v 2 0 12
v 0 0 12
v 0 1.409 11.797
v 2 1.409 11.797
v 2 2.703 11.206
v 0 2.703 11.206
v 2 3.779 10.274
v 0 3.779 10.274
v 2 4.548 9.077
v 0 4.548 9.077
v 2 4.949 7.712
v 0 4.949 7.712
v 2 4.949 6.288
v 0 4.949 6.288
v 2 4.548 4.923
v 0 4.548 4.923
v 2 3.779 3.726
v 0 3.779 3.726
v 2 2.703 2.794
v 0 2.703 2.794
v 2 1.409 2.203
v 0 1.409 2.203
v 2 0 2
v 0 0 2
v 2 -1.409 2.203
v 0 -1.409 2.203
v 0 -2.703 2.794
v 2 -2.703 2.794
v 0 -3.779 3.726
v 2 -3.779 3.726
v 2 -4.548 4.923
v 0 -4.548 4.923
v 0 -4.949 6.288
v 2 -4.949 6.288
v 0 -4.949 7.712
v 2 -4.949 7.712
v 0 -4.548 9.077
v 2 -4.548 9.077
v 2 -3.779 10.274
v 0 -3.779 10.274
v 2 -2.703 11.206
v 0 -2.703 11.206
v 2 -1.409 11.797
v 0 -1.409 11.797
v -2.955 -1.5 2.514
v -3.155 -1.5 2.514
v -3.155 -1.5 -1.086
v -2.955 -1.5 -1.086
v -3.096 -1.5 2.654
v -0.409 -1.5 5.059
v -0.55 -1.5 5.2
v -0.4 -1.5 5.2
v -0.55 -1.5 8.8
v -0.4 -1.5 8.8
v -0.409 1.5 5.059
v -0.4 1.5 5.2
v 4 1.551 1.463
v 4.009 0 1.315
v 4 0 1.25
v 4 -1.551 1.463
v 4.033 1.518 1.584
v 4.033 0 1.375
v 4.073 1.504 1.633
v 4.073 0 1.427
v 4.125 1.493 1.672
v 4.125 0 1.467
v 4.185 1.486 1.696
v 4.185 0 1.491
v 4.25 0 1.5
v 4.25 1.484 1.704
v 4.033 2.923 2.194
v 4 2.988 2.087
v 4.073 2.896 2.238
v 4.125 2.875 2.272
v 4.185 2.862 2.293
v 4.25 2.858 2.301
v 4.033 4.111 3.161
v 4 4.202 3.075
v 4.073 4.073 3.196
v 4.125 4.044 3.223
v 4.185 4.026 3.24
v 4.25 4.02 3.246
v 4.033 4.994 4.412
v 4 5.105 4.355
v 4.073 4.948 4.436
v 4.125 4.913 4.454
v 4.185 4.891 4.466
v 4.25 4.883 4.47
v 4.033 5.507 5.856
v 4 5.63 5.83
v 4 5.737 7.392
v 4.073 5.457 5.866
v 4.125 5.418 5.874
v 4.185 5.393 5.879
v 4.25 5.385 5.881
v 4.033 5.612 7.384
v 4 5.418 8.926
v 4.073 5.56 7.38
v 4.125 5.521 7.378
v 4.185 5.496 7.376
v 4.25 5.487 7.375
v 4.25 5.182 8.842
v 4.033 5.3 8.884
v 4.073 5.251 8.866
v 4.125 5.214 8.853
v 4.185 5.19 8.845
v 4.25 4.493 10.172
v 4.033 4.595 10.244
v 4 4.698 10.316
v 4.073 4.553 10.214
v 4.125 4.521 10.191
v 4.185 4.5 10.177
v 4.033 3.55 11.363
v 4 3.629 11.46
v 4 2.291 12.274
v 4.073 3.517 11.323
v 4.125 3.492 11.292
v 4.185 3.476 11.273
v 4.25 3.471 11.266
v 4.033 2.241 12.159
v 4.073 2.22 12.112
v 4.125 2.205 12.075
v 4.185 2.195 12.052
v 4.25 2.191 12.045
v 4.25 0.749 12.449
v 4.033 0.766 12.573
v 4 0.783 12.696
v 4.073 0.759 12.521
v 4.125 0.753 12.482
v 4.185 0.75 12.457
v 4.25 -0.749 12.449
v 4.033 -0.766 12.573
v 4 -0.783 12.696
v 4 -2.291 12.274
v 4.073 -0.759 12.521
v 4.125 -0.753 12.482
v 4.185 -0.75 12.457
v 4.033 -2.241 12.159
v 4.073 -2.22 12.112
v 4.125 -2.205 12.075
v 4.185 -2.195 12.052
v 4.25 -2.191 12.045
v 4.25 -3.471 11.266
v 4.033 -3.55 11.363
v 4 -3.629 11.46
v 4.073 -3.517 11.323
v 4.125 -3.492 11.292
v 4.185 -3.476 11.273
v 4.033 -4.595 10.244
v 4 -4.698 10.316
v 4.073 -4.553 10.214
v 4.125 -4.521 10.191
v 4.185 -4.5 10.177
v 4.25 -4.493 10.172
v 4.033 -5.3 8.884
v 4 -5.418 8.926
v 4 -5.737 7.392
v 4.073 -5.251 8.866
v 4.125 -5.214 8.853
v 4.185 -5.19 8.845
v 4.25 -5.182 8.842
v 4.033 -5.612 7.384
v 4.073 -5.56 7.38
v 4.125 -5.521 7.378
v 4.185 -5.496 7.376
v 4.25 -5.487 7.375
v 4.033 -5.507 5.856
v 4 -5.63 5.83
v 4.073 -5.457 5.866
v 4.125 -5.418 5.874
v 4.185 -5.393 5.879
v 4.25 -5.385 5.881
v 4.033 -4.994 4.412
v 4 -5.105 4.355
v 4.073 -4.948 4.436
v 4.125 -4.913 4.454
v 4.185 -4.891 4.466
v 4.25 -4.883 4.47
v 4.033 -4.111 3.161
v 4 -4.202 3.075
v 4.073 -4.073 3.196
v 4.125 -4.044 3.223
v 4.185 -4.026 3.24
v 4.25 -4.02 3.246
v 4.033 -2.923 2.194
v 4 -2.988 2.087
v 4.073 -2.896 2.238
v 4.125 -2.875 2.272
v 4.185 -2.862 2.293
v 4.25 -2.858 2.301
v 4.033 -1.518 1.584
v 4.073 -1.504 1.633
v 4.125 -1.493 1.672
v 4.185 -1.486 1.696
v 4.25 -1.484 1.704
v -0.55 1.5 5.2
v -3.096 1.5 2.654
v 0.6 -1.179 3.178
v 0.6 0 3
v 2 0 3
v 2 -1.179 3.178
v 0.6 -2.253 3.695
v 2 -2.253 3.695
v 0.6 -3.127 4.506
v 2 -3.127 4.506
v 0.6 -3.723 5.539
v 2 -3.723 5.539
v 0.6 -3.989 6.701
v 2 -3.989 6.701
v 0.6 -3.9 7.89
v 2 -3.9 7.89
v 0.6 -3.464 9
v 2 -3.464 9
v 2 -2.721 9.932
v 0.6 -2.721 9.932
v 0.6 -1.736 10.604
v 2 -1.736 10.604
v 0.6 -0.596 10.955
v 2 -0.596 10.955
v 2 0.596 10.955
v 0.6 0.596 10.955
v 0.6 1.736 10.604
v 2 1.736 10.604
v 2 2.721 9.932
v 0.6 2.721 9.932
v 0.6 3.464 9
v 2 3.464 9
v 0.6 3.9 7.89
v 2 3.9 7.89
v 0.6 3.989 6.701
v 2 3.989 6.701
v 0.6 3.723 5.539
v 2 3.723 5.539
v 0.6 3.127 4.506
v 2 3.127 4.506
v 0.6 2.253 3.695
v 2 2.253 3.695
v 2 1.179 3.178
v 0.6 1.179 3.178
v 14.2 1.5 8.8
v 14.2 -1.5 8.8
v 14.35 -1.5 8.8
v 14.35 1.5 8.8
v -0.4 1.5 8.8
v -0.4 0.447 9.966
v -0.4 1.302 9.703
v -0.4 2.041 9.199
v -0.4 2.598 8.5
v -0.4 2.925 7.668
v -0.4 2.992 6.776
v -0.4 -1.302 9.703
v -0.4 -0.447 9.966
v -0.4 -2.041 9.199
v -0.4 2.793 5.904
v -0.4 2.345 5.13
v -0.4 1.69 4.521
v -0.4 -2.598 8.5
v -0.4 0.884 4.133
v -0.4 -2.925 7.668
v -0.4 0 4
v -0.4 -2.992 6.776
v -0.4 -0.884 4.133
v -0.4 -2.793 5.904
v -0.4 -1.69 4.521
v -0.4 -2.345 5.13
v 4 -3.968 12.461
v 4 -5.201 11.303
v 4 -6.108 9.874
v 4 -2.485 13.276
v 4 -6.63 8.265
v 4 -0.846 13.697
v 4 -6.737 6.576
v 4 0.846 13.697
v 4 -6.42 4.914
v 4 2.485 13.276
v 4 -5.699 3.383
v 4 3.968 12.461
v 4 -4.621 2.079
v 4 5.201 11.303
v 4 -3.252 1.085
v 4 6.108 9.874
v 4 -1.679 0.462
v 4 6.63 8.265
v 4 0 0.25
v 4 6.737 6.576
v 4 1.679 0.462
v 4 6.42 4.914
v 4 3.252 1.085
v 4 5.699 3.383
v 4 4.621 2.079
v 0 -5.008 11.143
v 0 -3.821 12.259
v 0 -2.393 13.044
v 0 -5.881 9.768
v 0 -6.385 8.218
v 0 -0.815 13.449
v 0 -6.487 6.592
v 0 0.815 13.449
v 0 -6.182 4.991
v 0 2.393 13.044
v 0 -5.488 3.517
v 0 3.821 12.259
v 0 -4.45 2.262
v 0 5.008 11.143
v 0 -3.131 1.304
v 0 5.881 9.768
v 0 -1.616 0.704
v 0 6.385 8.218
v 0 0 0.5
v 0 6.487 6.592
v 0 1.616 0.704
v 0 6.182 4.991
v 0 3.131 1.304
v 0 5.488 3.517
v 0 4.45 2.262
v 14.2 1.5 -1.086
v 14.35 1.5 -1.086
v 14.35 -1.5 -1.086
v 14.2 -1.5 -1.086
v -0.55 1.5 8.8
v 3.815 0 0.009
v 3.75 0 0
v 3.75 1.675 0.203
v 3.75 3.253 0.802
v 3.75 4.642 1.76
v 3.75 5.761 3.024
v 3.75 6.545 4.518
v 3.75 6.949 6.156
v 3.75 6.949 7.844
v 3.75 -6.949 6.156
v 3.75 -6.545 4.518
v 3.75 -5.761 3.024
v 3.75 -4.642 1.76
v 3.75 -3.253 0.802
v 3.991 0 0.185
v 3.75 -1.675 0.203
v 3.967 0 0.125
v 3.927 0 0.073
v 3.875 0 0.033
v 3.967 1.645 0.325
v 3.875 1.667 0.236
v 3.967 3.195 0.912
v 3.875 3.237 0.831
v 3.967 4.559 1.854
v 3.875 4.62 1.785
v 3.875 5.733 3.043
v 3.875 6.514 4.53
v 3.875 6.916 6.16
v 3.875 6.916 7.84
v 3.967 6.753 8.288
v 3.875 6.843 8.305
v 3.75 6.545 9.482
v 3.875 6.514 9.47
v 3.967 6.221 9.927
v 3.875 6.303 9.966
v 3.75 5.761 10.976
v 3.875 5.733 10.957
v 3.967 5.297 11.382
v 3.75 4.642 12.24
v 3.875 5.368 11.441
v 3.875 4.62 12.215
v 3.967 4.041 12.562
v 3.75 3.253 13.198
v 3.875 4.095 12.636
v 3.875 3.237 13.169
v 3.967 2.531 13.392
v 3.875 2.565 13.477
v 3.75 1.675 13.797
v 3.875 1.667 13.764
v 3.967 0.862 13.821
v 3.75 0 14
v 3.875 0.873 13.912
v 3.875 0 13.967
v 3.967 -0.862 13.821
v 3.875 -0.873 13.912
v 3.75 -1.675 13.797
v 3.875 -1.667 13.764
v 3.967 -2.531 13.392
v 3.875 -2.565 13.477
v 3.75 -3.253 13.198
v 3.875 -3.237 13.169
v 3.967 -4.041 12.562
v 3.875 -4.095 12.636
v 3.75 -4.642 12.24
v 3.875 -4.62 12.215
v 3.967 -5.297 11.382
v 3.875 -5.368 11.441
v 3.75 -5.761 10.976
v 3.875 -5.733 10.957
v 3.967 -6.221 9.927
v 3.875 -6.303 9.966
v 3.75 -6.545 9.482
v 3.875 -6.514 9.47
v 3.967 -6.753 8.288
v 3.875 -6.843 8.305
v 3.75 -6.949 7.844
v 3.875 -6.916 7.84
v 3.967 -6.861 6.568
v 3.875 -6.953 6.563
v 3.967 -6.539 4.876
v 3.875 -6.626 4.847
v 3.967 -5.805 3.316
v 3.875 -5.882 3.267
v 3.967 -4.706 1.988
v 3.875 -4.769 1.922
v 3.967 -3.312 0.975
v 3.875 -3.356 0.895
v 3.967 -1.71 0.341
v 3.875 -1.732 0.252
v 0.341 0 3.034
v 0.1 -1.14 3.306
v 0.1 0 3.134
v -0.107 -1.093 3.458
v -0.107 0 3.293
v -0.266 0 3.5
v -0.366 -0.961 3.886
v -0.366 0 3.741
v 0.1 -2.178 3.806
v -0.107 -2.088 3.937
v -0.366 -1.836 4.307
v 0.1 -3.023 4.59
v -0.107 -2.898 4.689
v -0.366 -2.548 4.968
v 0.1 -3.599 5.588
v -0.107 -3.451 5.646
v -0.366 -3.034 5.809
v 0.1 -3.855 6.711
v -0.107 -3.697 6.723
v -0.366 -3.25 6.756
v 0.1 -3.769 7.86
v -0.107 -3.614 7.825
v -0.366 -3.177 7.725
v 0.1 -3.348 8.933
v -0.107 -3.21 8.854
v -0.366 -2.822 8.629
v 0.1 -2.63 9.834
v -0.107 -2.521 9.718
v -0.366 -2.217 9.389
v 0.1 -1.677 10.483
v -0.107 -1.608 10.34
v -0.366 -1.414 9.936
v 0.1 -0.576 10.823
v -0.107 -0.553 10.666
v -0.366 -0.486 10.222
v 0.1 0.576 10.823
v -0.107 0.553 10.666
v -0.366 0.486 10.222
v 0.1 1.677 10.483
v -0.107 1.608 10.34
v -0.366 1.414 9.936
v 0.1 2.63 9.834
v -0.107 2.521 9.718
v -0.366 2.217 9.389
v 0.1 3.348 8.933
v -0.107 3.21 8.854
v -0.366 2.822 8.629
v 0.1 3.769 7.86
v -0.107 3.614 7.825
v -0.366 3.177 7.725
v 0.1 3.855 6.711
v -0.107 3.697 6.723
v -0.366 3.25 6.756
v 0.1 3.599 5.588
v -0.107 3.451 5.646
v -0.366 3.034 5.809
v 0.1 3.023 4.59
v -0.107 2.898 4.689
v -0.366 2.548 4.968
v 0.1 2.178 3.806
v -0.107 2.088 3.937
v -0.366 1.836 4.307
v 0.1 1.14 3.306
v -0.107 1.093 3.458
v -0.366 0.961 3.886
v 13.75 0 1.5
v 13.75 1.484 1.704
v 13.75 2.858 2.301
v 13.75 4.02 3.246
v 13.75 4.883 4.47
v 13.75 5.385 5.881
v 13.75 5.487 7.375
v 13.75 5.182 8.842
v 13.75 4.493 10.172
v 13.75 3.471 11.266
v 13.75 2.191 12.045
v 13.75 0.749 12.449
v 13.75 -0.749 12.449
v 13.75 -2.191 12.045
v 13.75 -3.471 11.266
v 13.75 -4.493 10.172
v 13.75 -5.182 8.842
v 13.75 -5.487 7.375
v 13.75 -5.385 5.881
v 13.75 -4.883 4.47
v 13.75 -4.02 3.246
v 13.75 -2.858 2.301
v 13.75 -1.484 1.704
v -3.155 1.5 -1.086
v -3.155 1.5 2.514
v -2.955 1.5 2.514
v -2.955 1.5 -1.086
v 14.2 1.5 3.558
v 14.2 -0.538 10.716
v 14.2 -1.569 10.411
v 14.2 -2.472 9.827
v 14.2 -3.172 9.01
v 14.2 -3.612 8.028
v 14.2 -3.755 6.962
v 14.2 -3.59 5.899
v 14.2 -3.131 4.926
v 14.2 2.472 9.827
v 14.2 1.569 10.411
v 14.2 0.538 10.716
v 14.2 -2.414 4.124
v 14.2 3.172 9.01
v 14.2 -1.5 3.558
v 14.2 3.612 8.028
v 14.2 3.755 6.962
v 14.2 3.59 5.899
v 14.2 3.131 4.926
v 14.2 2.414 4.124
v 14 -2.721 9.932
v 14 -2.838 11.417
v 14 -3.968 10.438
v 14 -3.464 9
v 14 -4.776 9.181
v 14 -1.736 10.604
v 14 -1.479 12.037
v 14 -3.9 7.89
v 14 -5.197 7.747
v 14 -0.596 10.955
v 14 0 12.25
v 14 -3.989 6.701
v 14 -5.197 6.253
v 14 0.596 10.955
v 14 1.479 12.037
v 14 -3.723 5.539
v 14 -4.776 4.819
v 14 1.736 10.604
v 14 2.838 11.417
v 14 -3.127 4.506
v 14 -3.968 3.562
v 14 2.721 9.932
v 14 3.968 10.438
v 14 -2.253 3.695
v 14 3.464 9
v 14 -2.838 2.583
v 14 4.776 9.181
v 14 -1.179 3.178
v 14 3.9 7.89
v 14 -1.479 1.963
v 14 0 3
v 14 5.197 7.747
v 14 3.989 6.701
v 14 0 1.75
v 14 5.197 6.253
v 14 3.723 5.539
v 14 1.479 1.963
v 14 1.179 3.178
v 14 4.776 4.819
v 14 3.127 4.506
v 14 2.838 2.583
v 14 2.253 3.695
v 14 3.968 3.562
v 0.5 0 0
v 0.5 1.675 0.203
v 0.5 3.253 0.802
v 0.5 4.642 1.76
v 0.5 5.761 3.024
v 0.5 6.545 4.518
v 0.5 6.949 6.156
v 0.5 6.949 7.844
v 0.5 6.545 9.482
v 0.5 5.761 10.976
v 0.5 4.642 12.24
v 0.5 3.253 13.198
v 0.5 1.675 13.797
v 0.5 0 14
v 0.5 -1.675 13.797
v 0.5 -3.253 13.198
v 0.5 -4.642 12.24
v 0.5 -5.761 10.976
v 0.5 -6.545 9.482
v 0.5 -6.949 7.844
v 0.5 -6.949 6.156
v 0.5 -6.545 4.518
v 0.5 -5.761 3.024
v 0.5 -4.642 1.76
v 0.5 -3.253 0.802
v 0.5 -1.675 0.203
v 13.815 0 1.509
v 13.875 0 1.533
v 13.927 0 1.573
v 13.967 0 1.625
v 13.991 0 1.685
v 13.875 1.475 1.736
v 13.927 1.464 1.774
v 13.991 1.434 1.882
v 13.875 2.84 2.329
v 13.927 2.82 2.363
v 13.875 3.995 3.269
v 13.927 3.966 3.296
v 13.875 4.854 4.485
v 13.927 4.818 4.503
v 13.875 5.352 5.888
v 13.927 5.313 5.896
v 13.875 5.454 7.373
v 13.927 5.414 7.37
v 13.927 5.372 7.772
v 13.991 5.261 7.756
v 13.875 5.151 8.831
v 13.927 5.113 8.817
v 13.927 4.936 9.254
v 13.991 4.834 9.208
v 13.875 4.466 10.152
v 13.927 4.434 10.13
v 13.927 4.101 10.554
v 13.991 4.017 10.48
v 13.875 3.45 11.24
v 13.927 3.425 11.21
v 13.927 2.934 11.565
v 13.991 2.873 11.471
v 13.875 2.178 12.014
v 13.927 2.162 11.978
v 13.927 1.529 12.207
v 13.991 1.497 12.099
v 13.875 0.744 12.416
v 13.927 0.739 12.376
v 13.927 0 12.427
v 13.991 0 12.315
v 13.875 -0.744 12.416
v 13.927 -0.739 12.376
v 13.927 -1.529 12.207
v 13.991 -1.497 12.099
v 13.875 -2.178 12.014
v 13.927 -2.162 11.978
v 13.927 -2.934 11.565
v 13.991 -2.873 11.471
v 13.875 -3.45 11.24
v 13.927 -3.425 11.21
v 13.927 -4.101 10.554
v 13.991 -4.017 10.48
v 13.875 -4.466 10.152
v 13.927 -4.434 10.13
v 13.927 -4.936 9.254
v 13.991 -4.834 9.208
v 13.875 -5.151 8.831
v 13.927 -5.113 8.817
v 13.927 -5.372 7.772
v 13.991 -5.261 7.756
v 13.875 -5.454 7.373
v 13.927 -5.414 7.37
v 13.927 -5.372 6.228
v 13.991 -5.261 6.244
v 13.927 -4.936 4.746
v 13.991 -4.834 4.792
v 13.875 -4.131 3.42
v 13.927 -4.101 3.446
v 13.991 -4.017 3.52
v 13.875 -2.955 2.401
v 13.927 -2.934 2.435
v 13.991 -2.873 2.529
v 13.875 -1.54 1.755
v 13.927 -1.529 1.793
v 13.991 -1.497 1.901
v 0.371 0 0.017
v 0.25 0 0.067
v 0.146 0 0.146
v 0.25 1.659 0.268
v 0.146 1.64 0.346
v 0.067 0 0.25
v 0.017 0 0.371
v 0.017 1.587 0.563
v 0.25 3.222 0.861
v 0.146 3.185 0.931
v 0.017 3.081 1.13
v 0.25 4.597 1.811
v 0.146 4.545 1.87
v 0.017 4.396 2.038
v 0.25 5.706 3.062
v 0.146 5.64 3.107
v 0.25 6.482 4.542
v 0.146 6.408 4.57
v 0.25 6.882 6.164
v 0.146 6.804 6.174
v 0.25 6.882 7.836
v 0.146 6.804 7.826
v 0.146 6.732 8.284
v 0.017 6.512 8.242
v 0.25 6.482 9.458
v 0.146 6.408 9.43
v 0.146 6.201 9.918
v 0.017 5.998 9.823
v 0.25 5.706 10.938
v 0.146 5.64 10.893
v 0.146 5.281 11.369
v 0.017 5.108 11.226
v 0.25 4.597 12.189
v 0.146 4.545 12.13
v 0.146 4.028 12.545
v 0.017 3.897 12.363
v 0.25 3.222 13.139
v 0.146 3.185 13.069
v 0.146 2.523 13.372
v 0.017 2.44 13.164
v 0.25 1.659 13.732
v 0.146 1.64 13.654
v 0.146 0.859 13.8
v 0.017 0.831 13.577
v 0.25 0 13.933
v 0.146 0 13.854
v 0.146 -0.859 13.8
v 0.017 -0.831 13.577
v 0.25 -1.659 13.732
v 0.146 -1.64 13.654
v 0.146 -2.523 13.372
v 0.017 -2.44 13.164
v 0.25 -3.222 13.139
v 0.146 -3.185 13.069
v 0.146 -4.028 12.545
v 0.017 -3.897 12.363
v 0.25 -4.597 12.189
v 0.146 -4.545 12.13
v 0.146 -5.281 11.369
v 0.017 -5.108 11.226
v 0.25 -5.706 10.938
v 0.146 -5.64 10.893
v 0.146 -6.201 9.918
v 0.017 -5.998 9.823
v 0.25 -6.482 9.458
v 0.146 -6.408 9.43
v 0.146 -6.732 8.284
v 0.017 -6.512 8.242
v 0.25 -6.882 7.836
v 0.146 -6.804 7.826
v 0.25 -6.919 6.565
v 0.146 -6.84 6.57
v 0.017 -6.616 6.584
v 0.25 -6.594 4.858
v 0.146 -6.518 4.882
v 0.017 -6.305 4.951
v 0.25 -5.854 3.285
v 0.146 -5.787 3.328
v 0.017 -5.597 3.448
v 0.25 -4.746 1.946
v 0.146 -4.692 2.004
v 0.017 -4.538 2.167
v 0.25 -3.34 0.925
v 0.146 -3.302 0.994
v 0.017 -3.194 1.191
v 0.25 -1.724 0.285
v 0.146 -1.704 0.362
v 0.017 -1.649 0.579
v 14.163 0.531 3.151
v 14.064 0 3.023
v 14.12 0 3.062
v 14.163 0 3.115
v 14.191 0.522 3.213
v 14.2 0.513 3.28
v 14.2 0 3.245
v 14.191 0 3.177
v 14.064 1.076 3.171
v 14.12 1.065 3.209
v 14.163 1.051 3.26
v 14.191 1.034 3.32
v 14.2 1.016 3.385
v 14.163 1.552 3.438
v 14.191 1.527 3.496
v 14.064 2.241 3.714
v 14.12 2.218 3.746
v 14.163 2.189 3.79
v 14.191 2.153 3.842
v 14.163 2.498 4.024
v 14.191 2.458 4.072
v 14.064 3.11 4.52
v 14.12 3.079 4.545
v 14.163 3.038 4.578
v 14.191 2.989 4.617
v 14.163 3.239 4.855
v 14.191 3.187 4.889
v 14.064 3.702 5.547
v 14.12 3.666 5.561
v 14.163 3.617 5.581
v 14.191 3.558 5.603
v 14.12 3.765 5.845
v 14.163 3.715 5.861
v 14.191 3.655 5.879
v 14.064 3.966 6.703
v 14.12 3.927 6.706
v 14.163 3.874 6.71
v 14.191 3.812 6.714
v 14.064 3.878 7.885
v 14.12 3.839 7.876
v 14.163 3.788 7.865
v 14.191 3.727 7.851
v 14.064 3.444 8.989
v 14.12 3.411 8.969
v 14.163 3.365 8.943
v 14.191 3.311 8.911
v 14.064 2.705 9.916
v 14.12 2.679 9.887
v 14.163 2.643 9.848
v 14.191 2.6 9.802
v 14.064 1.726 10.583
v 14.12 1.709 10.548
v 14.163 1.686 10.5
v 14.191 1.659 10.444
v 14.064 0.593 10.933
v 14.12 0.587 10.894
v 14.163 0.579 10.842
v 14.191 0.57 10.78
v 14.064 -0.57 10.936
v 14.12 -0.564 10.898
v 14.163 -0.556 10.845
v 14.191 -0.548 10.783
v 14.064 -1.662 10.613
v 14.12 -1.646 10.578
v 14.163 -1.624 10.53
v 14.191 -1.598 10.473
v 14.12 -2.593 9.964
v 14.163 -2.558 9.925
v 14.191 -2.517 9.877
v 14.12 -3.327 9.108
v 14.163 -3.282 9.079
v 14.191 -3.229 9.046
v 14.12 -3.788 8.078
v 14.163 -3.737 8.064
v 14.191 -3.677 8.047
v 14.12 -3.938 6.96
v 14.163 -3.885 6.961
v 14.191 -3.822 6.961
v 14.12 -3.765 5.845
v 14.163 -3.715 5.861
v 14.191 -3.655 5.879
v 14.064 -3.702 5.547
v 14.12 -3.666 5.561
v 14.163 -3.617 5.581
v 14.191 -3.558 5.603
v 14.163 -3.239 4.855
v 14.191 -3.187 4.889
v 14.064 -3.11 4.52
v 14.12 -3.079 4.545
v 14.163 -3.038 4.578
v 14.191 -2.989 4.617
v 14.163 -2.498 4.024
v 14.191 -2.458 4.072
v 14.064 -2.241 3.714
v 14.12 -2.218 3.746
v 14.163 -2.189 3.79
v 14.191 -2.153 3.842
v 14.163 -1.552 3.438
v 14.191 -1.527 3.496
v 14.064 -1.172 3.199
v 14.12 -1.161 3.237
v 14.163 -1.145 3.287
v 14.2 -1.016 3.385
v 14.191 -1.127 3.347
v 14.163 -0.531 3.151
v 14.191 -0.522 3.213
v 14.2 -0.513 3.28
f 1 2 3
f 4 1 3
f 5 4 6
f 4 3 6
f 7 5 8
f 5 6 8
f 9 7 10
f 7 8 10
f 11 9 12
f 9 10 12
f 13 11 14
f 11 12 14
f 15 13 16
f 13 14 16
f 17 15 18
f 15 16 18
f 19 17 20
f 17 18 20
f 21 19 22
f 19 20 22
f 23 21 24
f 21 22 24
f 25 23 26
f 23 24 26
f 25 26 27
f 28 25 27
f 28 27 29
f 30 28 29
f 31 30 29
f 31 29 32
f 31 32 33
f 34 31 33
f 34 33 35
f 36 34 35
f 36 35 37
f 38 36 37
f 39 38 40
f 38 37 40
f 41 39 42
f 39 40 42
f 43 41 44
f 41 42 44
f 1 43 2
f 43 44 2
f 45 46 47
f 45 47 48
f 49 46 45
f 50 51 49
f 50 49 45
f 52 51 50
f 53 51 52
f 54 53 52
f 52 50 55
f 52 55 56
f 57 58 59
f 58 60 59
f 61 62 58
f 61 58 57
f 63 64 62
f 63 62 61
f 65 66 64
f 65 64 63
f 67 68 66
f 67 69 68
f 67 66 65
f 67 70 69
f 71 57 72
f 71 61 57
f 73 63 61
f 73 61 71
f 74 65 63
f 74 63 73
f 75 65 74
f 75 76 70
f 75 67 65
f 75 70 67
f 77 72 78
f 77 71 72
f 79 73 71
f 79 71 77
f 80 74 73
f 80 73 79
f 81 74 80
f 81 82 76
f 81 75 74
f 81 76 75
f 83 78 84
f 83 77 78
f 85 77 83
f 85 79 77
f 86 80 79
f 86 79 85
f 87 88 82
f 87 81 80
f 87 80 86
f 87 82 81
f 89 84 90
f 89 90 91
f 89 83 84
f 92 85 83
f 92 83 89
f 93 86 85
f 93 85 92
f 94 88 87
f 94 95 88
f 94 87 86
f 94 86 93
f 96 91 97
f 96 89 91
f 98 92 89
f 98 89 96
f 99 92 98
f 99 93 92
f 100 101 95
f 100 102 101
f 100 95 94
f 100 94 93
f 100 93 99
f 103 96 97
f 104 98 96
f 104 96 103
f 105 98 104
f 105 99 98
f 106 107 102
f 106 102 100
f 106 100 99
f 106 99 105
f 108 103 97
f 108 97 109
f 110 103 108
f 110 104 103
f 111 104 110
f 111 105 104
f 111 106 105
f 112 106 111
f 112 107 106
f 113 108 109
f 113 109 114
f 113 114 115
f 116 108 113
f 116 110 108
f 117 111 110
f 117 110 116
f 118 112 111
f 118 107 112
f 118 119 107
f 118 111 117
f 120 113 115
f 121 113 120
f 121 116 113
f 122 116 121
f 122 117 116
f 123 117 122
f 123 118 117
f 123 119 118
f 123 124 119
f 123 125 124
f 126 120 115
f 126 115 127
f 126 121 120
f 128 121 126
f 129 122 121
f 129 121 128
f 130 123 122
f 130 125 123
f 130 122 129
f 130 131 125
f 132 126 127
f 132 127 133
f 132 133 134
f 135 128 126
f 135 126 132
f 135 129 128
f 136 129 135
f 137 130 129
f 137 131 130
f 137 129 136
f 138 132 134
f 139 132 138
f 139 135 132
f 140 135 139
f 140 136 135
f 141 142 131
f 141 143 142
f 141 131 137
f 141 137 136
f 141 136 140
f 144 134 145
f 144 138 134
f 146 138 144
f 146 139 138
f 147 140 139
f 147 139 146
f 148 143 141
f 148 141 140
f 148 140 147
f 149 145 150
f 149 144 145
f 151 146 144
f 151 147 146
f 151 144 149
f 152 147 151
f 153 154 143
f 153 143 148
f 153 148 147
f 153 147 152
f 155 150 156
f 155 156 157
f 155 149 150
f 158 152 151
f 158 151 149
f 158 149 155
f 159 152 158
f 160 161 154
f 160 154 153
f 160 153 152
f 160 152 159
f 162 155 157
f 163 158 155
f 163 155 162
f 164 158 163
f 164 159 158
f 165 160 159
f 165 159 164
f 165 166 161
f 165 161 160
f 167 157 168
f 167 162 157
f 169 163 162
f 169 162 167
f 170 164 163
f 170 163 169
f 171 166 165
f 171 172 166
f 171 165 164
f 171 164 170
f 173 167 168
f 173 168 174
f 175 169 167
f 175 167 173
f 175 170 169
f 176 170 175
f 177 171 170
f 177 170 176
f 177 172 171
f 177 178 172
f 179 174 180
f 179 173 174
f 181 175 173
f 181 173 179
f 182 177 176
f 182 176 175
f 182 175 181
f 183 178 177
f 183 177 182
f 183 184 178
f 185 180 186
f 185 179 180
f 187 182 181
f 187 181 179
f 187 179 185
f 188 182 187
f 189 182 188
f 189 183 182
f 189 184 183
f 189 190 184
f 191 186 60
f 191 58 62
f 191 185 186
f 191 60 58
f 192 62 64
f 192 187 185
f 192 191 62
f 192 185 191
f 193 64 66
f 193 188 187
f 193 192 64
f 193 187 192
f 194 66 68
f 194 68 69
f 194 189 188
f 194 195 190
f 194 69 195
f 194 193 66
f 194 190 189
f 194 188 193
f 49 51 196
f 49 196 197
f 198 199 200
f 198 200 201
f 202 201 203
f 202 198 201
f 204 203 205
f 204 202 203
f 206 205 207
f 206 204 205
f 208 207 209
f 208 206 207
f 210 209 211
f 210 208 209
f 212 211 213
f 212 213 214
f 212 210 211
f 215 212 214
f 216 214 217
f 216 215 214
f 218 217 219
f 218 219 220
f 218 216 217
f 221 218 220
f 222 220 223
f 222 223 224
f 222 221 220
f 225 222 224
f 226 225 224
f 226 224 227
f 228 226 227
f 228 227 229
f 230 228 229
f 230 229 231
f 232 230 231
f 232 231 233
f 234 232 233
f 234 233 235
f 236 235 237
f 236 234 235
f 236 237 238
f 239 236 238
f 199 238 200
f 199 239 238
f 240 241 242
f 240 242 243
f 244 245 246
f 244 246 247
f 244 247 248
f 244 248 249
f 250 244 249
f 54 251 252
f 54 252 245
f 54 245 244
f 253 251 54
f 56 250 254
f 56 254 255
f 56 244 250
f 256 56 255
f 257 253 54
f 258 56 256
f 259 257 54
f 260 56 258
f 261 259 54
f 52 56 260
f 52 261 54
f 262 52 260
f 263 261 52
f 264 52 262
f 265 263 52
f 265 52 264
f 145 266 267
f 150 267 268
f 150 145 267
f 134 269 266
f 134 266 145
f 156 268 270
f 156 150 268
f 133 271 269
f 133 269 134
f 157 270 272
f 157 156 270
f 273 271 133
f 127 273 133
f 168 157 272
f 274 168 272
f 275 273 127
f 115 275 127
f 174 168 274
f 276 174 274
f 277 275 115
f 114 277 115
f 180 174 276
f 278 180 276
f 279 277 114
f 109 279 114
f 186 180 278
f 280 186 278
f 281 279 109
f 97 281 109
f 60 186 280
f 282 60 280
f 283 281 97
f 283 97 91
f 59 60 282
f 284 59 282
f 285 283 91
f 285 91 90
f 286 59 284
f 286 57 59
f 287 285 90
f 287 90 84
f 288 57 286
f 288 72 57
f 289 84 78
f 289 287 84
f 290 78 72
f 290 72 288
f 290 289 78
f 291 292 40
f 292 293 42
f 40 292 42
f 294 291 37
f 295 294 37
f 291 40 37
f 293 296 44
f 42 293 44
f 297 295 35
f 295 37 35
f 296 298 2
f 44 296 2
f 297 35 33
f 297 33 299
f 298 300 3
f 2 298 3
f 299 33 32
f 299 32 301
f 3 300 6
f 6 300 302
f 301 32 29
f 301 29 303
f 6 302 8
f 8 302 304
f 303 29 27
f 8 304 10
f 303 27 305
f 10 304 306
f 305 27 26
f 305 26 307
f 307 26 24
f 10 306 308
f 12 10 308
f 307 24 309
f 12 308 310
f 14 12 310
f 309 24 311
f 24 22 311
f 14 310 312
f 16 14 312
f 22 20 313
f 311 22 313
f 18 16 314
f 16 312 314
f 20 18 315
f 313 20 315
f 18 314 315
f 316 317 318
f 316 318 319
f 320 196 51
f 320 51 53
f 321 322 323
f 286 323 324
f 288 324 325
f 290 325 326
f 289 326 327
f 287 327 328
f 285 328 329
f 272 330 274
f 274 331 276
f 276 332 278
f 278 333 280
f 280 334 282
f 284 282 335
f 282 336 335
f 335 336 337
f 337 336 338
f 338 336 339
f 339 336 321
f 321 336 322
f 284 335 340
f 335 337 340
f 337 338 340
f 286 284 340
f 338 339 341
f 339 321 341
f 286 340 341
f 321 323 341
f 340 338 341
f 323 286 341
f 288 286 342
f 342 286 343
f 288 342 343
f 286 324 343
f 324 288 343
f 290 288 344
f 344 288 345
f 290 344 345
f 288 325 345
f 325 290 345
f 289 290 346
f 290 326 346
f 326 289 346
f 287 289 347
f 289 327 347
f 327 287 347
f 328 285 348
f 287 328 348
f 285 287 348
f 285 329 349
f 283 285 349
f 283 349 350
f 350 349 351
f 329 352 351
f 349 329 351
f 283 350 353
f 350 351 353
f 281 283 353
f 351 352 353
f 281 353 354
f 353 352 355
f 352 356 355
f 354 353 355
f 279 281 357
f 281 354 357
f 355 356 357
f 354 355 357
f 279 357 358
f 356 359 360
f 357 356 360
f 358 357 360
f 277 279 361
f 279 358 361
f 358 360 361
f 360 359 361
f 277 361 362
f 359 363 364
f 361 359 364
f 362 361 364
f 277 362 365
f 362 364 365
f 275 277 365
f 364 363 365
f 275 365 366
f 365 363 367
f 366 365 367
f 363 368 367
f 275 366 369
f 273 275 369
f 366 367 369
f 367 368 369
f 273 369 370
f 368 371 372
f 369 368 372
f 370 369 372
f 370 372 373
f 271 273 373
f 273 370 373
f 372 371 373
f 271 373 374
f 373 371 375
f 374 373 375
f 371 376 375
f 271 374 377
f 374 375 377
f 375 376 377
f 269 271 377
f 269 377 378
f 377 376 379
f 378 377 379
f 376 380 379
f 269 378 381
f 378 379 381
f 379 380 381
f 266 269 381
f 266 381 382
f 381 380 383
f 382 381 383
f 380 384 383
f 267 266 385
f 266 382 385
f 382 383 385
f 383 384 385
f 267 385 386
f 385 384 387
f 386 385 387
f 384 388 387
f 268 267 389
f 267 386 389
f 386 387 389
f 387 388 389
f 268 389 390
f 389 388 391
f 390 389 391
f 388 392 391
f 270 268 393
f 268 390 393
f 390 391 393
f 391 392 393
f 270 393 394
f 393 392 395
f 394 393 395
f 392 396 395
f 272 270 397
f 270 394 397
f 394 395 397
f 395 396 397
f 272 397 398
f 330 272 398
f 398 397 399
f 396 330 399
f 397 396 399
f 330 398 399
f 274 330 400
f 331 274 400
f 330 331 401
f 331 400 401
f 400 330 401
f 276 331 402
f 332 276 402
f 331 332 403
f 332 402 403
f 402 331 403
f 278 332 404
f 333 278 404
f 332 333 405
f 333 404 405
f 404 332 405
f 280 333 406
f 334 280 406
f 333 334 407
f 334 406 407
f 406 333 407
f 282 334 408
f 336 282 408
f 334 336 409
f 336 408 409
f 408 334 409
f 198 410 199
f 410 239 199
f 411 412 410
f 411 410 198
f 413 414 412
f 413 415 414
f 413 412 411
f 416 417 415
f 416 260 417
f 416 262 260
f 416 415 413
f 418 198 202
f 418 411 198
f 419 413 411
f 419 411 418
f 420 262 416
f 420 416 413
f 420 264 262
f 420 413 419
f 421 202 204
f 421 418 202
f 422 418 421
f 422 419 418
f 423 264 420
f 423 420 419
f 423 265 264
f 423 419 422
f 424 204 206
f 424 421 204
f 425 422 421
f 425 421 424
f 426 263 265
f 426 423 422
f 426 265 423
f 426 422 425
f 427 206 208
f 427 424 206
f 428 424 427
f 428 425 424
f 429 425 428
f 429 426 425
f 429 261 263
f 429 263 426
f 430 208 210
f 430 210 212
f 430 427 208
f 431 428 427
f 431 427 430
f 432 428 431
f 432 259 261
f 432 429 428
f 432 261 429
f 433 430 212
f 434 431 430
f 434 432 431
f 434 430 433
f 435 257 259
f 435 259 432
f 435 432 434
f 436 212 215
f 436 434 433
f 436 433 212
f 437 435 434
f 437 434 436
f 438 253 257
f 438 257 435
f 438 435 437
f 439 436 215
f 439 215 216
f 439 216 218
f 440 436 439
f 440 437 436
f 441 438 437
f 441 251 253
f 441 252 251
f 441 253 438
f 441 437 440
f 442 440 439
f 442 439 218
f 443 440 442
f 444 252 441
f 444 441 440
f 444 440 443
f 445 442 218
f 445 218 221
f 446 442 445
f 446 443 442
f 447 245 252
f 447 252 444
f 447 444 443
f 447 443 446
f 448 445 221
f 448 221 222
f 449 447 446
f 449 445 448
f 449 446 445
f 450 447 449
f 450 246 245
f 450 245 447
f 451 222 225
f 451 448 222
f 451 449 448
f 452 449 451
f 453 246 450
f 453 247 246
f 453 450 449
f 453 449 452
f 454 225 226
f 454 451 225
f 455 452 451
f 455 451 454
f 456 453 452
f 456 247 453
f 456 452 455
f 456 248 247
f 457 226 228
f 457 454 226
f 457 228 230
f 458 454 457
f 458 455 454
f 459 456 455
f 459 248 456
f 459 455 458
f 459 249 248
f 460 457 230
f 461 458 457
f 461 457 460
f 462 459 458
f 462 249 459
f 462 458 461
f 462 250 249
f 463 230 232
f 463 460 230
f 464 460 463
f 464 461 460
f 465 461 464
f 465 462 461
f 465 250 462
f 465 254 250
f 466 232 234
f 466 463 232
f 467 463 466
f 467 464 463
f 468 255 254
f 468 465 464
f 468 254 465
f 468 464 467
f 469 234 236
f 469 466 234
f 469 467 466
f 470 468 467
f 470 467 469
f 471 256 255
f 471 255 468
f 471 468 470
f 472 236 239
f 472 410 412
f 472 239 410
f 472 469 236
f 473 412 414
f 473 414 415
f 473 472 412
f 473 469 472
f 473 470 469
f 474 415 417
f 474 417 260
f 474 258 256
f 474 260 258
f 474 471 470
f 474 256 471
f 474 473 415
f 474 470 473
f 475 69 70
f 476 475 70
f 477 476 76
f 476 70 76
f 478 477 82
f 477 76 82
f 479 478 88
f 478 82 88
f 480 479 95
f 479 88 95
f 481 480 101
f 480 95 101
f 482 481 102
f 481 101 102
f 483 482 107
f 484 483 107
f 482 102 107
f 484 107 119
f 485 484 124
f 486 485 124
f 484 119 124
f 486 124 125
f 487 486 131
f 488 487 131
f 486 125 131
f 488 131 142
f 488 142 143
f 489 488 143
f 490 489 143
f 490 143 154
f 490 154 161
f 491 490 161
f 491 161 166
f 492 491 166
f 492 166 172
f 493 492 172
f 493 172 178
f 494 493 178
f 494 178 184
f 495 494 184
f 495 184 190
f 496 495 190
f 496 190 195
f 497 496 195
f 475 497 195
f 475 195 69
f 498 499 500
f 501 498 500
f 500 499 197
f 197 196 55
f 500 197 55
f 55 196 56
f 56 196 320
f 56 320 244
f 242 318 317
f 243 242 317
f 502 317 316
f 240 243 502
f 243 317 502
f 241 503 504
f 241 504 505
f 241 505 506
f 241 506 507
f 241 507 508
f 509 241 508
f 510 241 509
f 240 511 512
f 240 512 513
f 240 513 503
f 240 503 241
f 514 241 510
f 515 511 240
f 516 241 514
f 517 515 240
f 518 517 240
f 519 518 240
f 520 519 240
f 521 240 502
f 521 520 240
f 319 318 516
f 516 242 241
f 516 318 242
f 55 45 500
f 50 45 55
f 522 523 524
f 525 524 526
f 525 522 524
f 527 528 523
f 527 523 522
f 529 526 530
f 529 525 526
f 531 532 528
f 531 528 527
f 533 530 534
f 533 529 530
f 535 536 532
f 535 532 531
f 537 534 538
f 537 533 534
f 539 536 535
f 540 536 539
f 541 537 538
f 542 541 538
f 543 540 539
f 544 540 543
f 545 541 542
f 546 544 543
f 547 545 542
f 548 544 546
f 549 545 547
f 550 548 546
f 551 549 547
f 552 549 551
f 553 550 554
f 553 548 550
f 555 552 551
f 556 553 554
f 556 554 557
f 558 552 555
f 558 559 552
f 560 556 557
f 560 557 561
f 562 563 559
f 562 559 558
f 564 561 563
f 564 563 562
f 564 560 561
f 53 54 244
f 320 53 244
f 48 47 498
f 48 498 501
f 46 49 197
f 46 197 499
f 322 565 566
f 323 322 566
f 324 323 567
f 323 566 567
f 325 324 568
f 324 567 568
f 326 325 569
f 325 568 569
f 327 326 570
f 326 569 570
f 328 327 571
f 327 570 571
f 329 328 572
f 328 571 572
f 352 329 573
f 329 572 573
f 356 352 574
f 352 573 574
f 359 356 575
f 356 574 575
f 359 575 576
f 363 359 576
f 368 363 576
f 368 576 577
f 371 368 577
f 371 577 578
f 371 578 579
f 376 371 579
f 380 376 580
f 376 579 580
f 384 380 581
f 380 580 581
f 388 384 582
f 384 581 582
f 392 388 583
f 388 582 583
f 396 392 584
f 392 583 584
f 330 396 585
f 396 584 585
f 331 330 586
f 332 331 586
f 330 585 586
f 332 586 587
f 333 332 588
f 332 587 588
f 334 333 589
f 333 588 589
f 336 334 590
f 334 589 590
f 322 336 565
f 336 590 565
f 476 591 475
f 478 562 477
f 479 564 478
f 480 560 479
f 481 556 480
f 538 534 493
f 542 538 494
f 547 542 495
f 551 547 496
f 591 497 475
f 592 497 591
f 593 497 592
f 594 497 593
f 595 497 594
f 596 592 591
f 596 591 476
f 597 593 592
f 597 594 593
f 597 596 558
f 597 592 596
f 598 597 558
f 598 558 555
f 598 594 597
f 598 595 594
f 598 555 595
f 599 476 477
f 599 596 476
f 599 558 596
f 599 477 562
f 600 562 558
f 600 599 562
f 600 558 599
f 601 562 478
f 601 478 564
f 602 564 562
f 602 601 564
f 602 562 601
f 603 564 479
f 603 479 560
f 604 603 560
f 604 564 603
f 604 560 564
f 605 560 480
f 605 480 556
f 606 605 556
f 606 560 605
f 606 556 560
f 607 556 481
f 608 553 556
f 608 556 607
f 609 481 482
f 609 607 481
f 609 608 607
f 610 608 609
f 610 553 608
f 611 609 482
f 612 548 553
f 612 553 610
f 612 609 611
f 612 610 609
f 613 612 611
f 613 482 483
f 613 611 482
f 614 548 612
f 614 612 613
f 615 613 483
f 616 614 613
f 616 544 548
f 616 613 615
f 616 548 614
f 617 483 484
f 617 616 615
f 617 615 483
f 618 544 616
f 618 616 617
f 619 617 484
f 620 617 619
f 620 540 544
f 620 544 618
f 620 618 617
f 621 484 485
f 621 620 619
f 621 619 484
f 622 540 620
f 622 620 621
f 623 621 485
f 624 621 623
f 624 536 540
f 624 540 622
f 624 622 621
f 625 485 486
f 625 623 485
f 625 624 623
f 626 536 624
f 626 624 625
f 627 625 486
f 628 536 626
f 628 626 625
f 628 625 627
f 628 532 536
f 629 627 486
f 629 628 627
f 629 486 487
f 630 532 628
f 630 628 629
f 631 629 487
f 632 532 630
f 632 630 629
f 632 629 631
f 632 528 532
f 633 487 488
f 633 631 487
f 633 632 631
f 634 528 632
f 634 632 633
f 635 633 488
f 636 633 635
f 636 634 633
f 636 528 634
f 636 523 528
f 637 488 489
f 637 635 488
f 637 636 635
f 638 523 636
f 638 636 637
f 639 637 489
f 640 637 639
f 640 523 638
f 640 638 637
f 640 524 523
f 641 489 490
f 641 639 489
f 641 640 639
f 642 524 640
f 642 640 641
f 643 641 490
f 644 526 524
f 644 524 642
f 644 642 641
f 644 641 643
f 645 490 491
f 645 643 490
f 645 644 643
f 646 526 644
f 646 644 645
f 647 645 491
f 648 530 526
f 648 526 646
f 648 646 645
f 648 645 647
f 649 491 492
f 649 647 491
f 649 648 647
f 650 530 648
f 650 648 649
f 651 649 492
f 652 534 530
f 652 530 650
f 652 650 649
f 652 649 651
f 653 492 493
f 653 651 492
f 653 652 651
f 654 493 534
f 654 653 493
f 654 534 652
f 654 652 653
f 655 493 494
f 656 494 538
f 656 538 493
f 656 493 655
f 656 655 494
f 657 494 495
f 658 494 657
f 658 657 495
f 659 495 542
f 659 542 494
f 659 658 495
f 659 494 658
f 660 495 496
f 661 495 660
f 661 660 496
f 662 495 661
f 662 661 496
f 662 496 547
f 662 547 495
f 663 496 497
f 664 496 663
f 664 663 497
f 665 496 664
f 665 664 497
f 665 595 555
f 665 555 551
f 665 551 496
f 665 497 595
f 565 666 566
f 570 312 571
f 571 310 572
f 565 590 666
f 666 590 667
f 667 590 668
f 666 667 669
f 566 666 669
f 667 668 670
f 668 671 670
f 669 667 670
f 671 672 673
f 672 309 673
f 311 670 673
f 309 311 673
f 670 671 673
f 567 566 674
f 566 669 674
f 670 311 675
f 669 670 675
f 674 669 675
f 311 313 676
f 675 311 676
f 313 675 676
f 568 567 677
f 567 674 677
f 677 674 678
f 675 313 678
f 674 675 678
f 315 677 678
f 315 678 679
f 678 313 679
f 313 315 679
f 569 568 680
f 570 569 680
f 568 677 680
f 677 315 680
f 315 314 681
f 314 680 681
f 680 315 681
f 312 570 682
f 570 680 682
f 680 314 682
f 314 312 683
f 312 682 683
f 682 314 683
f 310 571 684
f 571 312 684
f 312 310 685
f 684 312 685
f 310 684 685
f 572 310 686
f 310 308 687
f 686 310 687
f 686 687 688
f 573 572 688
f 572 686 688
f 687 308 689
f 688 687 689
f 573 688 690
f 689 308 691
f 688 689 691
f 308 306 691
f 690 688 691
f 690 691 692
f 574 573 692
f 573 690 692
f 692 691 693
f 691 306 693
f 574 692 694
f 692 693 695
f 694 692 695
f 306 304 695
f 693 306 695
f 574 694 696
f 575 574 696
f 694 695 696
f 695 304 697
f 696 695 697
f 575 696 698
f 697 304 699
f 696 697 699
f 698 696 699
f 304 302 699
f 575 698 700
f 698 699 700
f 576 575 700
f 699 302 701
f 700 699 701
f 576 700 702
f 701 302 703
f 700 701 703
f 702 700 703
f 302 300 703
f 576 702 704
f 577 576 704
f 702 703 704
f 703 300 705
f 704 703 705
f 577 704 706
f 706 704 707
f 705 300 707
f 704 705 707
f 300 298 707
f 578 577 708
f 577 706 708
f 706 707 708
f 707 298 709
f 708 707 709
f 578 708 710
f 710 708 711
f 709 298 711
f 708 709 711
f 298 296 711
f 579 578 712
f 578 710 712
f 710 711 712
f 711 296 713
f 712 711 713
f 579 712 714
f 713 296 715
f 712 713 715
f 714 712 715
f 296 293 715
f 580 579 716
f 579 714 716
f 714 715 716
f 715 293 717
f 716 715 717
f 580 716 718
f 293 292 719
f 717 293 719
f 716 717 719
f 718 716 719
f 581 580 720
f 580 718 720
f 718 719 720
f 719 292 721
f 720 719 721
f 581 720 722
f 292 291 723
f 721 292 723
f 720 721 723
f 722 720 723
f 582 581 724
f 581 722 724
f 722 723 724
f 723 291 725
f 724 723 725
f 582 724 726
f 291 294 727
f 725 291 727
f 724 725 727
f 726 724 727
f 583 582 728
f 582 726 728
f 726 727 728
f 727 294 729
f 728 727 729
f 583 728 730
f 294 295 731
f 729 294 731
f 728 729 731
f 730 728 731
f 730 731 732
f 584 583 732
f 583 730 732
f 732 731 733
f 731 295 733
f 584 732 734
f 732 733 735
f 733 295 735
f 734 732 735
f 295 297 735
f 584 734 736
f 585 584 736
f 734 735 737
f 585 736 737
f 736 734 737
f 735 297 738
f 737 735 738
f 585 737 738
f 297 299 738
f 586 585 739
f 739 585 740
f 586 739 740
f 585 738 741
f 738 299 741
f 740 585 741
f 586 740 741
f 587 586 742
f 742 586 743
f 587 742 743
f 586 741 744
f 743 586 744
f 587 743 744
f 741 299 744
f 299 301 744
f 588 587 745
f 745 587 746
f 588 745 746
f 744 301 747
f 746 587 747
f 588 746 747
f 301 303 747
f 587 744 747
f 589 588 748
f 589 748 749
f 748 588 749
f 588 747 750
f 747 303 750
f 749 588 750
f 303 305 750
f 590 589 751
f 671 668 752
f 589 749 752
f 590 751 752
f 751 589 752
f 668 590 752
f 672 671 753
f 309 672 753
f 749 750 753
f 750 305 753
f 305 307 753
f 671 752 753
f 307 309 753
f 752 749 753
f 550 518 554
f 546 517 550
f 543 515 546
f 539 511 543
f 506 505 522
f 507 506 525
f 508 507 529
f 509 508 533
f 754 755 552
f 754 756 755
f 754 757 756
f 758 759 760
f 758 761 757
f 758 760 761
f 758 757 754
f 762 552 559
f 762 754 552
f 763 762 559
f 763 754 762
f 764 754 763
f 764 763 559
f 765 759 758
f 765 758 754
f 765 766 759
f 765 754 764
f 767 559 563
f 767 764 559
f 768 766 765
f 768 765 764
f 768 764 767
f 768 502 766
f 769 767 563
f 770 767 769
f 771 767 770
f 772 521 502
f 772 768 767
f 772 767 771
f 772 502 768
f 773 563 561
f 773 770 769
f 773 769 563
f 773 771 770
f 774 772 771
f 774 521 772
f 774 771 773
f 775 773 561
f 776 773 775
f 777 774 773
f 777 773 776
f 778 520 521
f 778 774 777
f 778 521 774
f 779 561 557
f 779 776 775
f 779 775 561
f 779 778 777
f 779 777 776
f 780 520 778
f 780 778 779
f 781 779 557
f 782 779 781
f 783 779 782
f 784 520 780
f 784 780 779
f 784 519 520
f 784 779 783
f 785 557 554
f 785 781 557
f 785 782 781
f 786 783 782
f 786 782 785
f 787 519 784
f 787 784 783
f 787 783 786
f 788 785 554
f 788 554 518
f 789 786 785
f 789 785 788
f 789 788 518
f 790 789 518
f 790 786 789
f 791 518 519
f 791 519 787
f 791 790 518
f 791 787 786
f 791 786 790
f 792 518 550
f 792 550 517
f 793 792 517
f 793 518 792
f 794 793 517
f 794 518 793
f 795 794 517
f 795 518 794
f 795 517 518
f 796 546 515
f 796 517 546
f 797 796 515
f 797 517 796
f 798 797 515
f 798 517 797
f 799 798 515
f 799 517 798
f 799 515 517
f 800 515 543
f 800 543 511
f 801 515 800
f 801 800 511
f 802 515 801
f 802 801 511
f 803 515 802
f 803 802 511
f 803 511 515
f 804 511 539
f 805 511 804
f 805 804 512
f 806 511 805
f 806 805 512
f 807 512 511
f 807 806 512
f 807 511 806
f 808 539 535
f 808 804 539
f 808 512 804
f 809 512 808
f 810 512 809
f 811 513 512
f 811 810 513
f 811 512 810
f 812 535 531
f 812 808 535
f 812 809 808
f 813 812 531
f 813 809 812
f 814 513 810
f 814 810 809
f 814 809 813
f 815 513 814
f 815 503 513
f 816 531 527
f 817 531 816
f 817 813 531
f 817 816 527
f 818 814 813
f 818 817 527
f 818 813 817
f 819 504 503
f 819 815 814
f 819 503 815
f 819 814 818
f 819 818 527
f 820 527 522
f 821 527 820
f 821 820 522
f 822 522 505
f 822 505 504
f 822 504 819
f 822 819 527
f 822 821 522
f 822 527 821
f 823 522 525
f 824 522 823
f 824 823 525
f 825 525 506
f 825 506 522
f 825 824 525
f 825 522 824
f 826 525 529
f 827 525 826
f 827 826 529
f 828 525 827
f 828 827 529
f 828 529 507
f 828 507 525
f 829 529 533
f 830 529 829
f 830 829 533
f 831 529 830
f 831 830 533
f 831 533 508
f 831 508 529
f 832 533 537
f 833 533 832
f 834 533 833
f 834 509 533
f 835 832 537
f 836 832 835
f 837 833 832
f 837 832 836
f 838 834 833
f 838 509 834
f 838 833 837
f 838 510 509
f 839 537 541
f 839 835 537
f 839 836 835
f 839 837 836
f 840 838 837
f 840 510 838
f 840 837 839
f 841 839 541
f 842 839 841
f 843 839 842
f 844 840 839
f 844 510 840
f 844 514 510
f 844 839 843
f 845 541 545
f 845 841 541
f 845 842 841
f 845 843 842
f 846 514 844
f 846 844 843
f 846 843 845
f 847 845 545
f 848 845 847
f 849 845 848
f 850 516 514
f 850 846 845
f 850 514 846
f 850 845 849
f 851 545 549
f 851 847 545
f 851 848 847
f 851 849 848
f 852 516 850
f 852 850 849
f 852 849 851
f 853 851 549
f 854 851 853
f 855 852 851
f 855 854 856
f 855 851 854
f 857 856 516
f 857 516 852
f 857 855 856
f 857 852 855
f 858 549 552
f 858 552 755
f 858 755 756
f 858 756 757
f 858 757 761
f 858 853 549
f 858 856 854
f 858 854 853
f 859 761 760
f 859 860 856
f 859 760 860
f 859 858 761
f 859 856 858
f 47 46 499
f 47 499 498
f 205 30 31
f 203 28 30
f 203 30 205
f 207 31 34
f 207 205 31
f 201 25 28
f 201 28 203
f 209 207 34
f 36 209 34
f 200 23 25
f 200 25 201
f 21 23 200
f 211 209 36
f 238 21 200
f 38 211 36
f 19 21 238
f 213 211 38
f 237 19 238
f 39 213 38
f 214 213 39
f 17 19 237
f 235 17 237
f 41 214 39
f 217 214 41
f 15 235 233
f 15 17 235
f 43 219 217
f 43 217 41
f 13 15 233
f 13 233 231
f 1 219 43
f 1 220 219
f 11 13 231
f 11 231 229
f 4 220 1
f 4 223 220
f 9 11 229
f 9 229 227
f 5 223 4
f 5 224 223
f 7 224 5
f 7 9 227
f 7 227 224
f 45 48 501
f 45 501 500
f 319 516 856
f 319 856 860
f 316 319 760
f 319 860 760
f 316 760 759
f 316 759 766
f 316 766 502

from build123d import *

# Parameters (mm, degrees)
SKETCH1_R           = 7
BOSS_EXTRUDE1_DEPTH = 4
SKETCH2_R           = 5.5
BOSS_EXTRUDE2_DEPTH = 10
SKETCH3_R           = 4
BOSS_EXTRUDE3_DEPTH = 0.2
SKETCH4_R           = 5
SKETCH4_R_2         = 4
CUT_EXTRUDE3_DEPTH  = 2
BOSS_EXTRUDE4_START = 0.4
SKETCH5_R           = 4
BOSS_EXTRUDE4_DEPTH = 0.4
FILLET1_R           = 0.25
FILLET2_R           = 0.25
FILLET3_R           = 0.5
FILLET4_R           = 1
FILLET5_R           = 0.25
BOSS_EXTRUDE5_DEPTH = 0.15
BOSS_EXTRUDE6_DEPTH = 3
BOSS_EXTRUDE7_DEPTH = 0.15
SKETCH11_W          = 0.15
SKETCH11_H          = 3
BOSS_EXTRUDE8_DEPTH = 6.286100837


with BuildPart() as part:
    # Sketch1 → Boss-Extrude1 (new body)
    with BuildSketch(Plane(origin=(0, 0, 0), x_dir=(0, 0, -1), z_dir=(1, 0, 0))):
        with Locations((-7, 0)):
            Circle(SKETCH1_R)
    extrude(amount=BOSS_EXTRUDE1_DEPTH)

    # Sketch2 → Boss-Extrude2 (add)
    with BuildSketch(Plane(origin=(4, 0, 0), x_dir=(0, 0, -1), z_dir=(1, 0, 0))):
        with Locations((-7, 0)):
            Circle(SKETCH2_R)
    extrude(amount=BOSS_EXTRUDE2_DEPTH)

    # Sketch3 → Boss-Extrude3 (add)
    with BuildSketch(Plane(origin=(14, 0, 0), x_dir=(0, 0, -1), z_dir=(1, 0, 0))):
        with Locations((-7, 0)):
            Circle(SKETCH3_R)
    extrude(amount=BOSS_EXTRUDE3_DEPTH)

    # Sketch4 → Cut-Extrude3 (cut)
    with BuildSketch(Plane.ZY):
        with Locations((7, 0)):
            Circle(SKETCH4_R)
        with Locations(Location((7, 0, 0), (0, 0, 180))):
            Circle(SKETCH4_R_2, mode=Mode.SUBTRACT)
    extrude(amount=-CUT_EXTRUDE3_DEPTH, mode=Mode.SUBTRACT)

    # Sketch5 → Boss-Extrude4 (add)
    with BuildSketch(Plane.ZY.offset(BOSS_EXTRUDE4_START)):
        with Locations(Location((7, 0, 0), (0, 0, 180))):
            Circle(SKETCH5_R)
    extrude(amount=-BOSS_EXTRUDE4_DEPTH)

    # Fillet1
    fillet1_edges = [part.edges().sort_by_distance(p)[0] for p in [
        (4, 0, 12.5),
    ]]
    fillet(fillet1_edges, radius=FILLET1_R)

    # Fillet2
    fillet2_edges = [part.edges().sort_by_distance(p)[0] for p in [
        (4, 0, 14),
    ]]
    fillet(fillet2_edges, radius=FILLET2_R)

    # Fillet3
    fillet3_edges = [part.edges().sort_by_distance(p)[0] for p in [
        (0, 0, 14),
    ]]
    fillet(fillet3_edges, radius=FILLET3_R)

    # Fillet4
    fillet4_edges = [part.edges().sort_by_distance(p)[0] for p in [
        (-0.4, 0, 11),
    ]]
    fillet(fillet4_edges, radius=FILLET4_R)

    # Fillet5
    # the kernel refuses this fillet: 0.25 mm, written as the material it takes off along each edge
    with BuildSketch(Plane(origin=(14.2, 0, 7), x_dir=(0, 0, -1), z_dir=(0, -1, 0))) as fillet5_piece_1:
        with BuildLine():
            CenterArc((3.755051026, -0.25), FILLET5_R, 11.536959033, 78.463040967)
            Line((3.755051026, 0), (3.755051026, 0.005))
            Line((3.755051026, 0.005), (4, 0.005))
            Line((4, 0.005), (4.005, 0))
            ThreePointArc((4.005, 0), (4.005, -0.1), (4.004898979, -0.199))
            Line((4.004898979, -0.199), (4, -0.2))
        make_face()
    revolve(axis=Axis((14.2, 0, 7), (1, 0, 0)), mode=Mode.SUBTRACT)
    with BuildSketch(Plane(origin=(14, 0, 7), x_dir=(0, 0, -1), z_dir=(0, -1, 0))) as fillet5_piece_2:
        with BuildLine():
            CenterArc((5.5 - FILLET5_R, -FILLET5_R), FILLET5_R, 0, 90)
            Line((5.5 - FILLET5_R, 0), (5.5 - FILLET5_R, FILLET5_R * 0.02))
            Line((5.5 - FILLET5_R, FILLET5_R * 0.02), (5.5 + FILLET5_R * 0.02, FILLET5_R * 0.02))
            Line((5.5 + FILLET5_R * 0.02, FILLET5_R * 0.02), (5.5 + FILLET5_R * 0.02, -FILLET5_R))
            Line((5.5 + FILLET5_R * 0.02, -FILLET5_R), (5.5, -FILLET5_R))
        make_face()
    revolve(axis=Axis((14, 0, 7), (1, 0, 0)), mode=Mode.SUBTRACT)

    # Sketch6 → Boss-Extrude5 (add)
    with BuildSketch(Plane.ZY.offset(0.4)):
        Polygon((7, -1.5), (8.8, -1.5), (8.8, 1.5), (5.2, 1.5), (5.2, -1.5), align=None)
    extrude(amount=BOSS_EXTRUDE5_DEPTH)

    # Sketch7 → Boss-Extrude6 (add)
    with BuildSketch(Plane.XZ.offset(1.5)):
        Polygon((-0.55, 5.2), (-3.095584412, 2.654415588), (-3.155067988, 2.513899163), (-3.155067988, -1.086100837), (-2.955067988, -1.086100837), (-2.955067988, 2.513899163), (-0.409483576, 5.059483576), (-0.4, 5.2), align=None)
    extrude(amount=-BOSS_EXTRUDE6_DEPTH)

    # Sketch8 → Boss-Extrude7 (add)
    with BuildSketch(Plane(origin=(14.2, 0, 0), x_dir=(0, 0, -1), z_dir=(1, 0, 0))):
        Polygon((-7, -1.5), (-8.8, -1.5), (-8.8, 1.5), (-5.2, 1.5), (-5.2, -1.5), align=None)
    extrude(amount=BOSS_EXTRUDE7_DEPTH)

    # Sketch11 → Boss-Extrude8 (add)
    with BuildSketch(Plane(origin=(0, 0, 5.2), x_dir=(-1, 0, 0), z_dir=(0, 0, -1))):
        with Locations((-14.275, 0)):
            Rectangle(SKETCH11_W, SKETCH11_H)
    extrude(amount=BOSS_EXTRUDE8_DEPTH)


solid = part.part
